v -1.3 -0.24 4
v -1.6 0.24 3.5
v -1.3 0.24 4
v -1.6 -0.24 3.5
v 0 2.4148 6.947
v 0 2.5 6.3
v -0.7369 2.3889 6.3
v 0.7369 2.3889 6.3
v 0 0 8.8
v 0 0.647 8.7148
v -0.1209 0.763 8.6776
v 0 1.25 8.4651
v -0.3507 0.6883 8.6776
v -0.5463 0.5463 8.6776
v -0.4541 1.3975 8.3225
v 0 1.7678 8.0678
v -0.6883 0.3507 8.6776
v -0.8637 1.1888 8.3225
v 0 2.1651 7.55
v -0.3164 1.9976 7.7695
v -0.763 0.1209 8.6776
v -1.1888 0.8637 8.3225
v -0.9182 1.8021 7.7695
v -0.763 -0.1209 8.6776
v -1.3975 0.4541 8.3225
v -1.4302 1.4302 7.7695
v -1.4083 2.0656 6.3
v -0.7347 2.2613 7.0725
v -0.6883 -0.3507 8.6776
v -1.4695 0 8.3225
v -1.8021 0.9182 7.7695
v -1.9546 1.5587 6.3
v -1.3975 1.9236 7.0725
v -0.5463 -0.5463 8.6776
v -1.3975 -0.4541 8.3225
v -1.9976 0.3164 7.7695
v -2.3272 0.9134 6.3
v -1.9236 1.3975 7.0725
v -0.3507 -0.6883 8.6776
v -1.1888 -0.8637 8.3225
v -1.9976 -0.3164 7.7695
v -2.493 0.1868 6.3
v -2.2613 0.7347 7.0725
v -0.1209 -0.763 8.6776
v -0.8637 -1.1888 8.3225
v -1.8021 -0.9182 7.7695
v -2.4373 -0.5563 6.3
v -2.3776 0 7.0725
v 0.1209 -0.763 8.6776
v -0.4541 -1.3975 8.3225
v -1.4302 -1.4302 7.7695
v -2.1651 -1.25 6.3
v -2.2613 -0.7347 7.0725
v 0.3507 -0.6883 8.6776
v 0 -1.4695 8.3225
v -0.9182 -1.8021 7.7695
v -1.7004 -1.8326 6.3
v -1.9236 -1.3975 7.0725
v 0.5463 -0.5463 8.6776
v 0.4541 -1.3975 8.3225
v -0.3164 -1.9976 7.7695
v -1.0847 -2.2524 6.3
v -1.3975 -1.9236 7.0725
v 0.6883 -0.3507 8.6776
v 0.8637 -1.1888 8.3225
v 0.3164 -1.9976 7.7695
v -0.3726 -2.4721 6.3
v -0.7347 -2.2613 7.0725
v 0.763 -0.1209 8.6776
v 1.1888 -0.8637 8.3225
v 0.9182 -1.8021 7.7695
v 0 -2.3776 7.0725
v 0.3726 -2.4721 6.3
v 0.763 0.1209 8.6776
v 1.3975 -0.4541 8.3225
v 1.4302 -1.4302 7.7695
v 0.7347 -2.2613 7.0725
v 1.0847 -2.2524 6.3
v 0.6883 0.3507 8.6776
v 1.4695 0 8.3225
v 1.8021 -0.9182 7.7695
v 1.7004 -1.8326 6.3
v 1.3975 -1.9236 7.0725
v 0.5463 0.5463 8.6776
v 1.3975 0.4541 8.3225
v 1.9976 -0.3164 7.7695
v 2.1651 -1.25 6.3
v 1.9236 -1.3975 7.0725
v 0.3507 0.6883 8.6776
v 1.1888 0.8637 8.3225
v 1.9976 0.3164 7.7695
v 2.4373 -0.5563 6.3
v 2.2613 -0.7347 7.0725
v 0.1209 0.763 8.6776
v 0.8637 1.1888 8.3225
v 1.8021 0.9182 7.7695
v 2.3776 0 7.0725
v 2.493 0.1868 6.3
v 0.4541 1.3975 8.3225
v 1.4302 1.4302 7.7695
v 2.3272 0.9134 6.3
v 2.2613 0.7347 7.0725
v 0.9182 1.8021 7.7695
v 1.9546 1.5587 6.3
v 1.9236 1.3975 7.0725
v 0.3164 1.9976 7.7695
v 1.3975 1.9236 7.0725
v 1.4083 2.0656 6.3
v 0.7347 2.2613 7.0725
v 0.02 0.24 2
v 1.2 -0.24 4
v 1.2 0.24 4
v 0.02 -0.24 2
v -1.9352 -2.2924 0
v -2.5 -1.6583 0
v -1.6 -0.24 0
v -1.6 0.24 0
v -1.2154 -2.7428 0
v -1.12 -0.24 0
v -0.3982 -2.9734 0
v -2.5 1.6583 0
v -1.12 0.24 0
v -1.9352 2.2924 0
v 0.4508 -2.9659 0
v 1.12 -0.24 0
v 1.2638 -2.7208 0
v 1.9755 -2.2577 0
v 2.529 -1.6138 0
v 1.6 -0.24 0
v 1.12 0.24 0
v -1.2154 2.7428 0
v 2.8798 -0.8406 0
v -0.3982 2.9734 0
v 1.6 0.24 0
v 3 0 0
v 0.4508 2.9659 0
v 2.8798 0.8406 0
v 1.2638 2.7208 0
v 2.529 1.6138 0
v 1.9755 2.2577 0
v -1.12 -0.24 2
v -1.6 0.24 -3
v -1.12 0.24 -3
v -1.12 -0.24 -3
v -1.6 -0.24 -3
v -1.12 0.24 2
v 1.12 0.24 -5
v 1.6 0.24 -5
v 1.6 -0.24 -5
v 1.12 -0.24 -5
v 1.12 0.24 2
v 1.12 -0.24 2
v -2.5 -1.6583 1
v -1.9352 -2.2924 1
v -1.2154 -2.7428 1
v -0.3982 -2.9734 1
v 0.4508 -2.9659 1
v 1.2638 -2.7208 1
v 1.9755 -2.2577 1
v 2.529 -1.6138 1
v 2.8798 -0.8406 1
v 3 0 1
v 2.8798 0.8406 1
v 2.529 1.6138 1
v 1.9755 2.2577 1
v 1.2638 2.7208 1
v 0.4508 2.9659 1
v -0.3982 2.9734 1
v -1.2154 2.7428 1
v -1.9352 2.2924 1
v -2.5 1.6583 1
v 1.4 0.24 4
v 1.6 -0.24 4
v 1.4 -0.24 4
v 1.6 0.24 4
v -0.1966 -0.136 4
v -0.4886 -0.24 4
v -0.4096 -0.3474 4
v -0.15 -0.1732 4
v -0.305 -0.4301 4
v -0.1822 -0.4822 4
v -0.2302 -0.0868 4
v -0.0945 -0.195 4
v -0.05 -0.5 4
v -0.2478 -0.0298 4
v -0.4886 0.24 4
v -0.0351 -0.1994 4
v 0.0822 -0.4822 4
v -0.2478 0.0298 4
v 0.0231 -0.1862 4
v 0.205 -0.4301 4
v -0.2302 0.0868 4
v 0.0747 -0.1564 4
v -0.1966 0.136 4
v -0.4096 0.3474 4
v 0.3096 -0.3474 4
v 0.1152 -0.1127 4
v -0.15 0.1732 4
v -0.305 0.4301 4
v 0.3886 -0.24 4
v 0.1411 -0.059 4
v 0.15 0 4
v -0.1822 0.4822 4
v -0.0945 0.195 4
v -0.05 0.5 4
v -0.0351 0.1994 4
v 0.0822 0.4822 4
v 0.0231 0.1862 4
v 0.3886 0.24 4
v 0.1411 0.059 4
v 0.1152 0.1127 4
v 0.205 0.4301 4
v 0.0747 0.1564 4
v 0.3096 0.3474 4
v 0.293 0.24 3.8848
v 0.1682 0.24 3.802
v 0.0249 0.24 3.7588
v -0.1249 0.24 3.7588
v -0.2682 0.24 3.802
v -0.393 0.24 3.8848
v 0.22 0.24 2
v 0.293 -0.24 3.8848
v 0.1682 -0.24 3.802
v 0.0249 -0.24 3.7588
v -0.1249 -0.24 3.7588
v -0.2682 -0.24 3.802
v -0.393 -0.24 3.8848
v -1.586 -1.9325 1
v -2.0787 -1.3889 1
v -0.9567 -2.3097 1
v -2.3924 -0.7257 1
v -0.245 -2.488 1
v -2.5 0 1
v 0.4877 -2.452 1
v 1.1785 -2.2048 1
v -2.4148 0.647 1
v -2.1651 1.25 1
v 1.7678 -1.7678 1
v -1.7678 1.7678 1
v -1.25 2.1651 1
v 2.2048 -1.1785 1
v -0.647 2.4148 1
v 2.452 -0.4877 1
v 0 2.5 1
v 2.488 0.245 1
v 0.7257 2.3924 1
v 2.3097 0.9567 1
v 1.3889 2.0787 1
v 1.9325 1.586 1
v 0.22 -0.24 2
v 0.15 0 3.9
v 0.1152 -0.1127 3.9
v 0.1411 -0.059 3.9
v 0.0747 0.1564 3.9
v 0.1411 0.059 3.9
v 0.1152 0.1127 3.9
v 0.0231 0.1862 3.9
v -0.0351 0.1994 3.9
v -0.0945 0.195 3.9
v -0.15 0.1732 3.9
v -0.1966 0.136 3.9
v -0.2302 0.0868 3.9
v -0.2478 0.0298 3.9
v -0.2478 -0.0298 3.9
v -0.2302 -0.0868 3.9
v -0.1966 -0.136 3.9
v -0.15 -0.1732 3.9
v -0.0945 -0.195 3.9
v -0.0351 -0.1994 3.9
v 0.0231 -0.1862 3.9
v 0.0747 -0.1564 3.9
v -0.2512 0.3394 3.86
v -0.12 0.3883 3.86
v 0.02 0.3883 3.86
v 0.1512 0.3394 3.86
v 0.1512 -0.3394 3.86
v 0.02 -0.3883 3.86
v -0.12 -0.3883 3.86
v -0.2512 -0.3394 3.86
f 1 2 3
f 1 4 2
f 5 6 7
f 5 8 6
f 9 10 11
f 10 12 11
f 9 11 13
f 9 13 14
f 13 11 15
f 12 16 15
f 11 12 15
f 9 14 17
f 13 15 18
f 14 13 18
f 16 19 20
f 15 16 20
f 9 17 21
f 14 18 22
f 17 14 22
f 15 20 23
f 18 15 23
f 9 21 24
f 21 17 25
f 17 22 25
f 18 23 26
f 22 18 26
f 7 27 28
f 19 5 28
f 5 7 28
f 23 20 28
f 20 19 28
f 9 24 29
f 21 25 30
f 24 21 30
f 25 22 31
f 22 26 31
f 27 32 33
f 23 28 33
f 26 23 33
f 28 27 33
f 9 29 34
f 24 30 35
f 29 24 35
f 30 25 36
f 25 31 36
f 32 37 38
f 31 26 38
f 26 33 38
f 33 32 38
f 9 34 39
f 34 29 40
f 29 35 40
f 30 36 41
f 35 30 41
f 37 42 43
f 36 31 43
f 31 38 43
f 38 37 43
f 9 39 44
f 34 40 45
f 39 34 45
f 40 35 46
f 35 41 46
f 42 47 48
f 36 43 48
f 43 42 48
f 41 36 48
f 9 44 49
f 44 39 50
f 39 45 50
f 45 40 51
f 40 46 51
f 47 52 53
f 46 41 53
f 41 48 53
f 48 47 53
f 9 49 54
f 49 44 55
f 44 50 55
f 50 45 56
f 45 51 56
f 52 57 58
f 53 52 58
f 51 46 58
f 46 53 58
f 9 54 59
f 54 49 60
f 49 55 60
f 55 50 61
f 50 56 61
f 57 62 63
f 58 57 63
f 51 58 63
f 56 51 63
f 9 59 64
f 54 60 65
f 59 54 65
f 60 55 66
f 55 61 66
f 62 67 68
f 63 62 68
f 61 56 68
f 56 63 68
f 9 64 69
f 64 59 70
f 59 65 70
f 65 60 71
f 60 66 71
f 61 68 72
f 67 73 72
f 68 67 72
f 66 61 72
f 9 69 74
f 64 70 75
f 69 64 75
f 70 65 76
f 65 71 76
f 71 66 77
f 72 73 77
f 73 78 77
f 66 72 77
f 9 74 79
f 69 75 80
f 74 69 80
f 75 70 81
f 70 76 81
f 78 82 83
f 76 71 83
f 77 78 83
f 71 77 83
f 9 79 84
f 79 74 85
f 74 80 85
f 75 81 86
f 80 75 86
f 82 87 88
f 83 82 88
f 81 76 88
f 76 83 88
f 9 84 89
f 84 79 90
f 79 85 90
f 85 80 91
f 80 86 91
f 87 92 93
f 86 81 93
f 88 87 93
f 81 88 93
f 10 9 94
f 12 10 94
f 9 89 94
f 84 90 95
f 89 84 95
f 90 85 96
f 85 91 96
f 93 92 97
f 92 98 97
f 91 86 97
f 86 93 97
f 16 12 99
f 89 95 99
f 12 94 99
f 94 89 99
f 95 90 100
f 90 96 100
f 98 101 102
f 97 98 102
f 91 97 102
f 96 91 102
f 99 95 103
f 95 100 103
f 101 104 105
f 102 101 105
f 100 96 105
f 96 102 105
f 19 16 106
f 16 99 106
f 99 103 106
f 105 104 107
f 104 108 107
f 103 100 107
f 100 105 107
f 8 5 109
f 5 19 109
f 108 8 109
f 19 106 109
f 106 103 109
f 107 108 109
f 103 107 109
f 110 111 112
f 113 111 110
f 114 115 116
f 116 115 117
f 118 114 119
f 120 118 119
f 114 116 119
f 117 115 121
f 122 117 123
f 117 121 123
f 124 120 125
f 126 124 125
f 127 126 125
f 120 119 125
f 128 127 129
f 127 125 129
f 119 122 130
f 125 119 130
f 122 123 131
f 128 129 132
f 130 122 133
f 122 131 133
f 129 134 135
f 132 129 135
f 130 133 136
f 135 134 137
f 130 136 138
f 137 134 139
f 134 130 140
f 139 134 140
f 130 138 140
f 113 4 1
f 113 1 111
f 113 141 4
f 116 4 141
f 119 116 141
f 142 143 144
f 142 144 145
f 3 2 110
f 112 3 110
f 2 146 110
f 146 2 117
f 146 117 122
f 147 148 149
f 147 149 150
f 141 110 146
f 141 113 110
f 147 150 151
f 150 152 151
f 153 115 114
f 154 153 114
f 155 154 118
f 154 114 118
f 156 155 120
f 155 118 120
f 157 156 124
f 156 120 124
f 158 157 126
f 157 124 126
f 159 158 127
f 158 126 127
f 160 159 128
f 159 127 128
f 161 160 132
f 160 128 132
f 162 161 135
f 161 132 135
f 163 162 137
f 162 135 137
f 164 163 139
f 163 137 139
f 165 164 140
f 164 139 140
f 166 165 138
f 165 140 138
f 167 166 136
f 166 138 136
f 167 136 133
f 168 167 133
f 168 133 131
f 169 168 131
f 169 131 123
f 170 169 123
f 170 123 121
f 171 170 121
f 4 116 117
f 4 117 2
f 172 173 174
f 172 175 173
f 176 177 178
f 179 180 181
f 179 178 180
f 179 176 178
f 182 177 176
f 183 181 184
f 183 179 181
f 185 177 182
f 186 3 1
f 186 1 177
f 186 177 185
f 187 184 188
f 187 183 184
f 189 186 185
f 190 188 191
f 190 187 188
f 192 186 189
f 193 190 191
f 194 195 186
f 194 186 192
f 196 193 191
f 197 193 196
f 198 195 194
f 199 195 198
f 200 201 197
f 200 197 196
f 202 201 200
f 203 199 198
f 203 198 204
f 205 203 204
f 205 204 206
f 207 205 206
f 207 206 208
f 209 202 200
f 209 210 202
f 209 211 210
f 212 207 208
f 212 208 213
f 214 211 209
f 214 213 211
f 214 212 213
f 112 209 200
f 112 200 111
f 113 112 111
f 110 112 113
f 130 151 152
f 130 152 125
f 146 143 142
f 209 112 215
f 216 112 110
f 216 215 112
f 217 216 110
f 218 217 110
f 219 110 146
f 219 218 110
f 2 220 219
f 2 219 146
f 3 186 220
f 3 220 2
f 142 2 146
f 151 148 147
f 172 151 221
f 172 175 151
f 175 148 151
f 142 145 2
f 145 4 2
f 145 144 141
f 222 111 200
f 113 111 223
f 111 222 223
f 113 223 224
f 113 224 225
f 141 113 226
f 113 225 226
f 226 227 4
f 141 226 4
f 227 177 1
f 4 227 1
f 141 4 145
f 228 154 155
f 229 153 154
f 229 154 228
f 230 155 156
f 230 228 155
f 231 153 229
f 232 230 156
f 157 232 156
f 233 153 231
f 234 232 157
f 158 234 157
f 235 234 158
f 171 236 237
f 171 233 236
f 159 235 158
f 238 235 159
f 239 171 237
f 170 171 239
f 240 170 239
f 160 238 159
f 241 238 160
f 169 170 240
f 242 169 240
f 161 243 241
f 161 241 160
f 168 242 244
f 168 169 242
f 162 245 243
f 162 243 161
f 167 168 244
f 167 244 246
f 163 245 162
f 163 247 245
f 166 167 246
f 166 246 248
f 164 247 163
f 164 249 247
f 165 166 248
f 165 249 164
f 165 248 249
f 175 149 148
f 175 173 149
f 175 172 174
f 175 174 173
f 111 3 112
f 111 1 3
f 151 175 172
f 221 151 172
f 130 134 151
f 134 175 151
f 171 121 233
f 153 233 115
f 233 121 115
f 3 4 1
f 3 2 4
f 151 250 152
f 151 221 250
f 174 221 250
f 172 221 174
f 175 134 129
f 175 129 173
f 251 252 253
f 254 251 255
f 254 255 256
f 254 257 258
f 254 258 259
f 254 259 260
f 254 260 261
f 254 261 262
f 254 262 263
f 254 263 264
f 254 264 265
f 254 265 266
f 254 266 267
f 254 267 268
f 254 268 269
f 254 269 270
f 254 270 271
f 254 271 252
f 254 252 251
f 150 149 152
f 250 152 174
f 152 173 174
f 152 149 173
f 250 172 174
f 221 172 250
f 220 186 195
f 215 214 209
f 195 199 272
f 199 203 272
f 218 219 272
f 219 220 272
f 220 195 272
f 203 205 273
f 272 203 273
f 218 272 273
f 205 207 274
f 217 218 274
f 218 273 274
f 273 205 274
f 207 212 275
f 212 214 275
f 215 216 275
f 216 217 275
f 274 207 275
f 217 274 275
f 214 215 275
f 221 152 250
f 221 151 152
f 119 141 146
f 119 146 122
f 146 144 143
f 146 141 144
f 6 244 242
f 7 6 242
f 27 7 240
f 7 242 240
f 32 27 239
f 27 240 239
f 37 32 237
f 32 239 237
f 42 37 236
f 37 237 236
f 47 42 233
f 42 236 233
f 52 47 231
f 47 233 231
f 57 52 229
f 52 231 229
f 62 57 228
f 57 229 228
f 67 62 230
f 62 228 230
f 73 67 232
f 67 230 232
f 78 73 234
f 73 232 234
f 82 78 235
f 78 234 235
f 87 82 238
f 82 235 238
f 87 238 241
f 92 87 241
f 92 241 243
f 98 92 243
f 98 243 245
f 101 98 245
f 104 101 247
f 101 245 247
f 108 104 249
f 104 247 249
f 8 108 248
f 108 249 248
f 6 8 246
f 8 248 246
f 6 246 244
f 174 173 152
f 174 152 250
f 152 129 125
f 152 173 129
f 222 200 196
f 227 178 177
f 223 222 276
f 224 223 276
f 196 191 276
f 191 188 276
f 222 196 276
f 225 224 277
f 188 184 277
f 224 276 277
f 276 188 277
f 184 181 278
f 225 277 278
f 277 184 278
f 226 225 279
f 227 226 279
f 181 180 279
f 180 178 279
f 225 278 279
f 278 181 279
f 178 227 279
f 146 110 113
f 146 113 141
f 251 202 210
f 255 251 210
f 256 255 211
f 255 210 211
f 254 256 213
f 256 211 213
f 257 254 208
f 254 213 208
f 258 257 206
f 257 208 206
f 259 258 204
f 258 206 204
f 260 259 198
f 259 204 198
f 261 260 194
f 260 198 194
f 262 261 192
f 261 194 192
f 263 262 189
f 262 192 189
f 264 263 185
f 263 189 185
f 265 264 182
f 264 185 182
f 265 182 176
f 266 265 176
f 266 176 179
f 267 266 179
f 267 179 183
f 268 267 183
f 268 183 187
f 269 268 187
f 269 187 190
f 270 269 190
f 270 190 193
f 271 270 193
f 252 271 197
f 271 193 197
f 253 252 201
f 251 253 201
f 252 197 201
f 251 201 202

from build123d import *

# Parameters (mm, degrees)
ESBO_O1_R                  = 3
RESSALTO_EXTRUS_O1_DEPTH   = 1
CORTE_EXTRUS_O1_DEPTH      = 1
ESBO_O5_W                  = 0.48
ESBO_O5_H                  = 0.48
RESSALTO_EXTRUS_O2_DEPTH   = 3
RESSALTO_EXTRUS_O2_2_DEPTH = 3
ESBO_O6_W                  = 0.48
ESBO_O6_H                  = 0.48
RESSALTO_EXTRUS_O3_DEPTH   = 2
CORTE_EXTRUS_O2_DEPTH      = 0.24
RESSALTO_EXTRUS_O4_DEPTH   = 0.24
RESSALTO_EXTRUS_O4_2_DEPTH = 0.24
ESBO_O12_R                 = 0.2
CORTE_EXTRUS_O3_DEPTH      = 0.1


with BuildPart() as part:
    # Esboço1 → Ressalto-extrusão1 (new body)
    with BuildSketch(Plane.XY):
        Circle(ESBO_O1_R)
    extrude(amount=RESSALTO_EXTRUS_O1_DEPTH)

    # Esboço3 → Revolução1 (revolve)
    with BuildSketch(Plane(origin=(0, 0, 0), x_dir=(0, 0, -1), z_dir=(1, 0, 0))):
        with BuildLine():
            Line((-1, 0), (-8.8, 0))
            ThreePointArc((-8.8, 0), (-8.067766953, 1.767766953), (-6.3, 2.5))
            Line((-6.3, 2.5), (-1, 2.5))
            Line((-1, 2.5), (-1, 0))
        make_face()
    revolve(axis=Axis((0, 0, 1), (0, 0, 1)))

    # Esboço4 → Corte-extrusão1 (cut)
    with BuildSketch(Plane(origin=(0, 0, 0), x_dir=(-1, 0, 0), z_dir=(0, 0, -1))):
        with BuildLine():
            Line((2.5, 1.658312395), (2.5, -1.658312395))
            ThreePointArc((2.5, -1.658312395), (3, 0), (2.5, 1.658312395))
        make_face()
    extrude(amount=-CORTE_EXTRUS_O1_DEPTH, mode=Mode.SUBTRACT)

    # Esboço7 → Corte-extrusão2 (cut, symmetric)
    with BuildSketch(Plane(origin=(0, 0, 0), x_dir=(1, 0, 0), z_dir=(0, 1, 0))):
        Polygon((-1.6, 0), (-1.6, -3.5), (-1.3, -4), (1.2, -4), (0.02, -2), (-1.12, -2), (-1.12, 0), align=None)
        Polygon((1.6, 0), (1.6, -4), (1.4, -4), (0.22, -2), (1.12, -2), (1.12, 0), align=None)
    extrude(amount=CORTE_EXTRUS_O2_DEPTH, both=True, mode=Mode.SUBTRACT)


with BuildPart() as body_2:
    # Esboço5 → Ressalto-extrusão2 (new body)
    with BuildSketch(Plane(origin=(0, 0, 0), x_dir=(-1, 0, 0), z_dir=(0, 0, -1))):
        with Locations((-1.36, 0)):
            Rectangle(ESBO_O5_W, ESBO_O5_H)
    extrude(amount=RESSALTO_EXTRUS_O2_DEPTH)


with BuildPart() as body_3:
    # Esboço5 → Ressalto-extrus_o2 2 (new body)
    with BuildSketch(Plane(origin=(0, 0, 0), x_dir=(-1, 0, 0), z_dir=(0, 0, -1))):
        with Locations((1.36, 0)):
            Rectangle(ESBO_O5_W, ESBO_O5_H)
    extrude(amount=RESSALTO_EXTRUS_O2_2_DEPTH)


with BuildPart() as body_4:
    # Esboço6 → Ressalto-extrusão3 (new body)
    with BuildSketch(Plane(origin=(0, 0, -3), x_dir=(-1, 0, 0), z_dir=(0, 0, -1))):
        with Locations((-1.36, 0)):
            Rectangle(ESBO_O6_W, ESBO_O6_H)
    extrude(amount=RESSALTO_EXTRUS_O3_DEPTH)


with BuildPart() as body_5:
    # Esboço8 → Ressalto-extrusão4 (new, symmetric)
    with BuildSketch(Plane(origin=(0, 0, 0), x_dir=(1, 0, 0), z_dir=(0, 1, 0))):
        Polygon((-1.3, -4), (1.2, -4), (0.02, -2), (-1.12, -2), (-1.12, 0), (-1.6, 0), (-1.6, -3.5), align=None)
    extrude(amount=RESSALTO_EXTRUS_O4_DEPTH, both=True)

    # Combinar2: union body 3
    add(body_3.part)

    # Esboço10 → Corte-Revolução1 (revolve, cut)
    with BuildSketch(Plane(origin=(0, 0, 0), x_dir=(1, 0, 0), z_dir=(0, 1, 0))):
        with BuildLine():
            Line((-0.05, -4), (-0.05, -3.7))
            ThreePointArc((-0.05, -3.7), (-0.341547595, -3.780754009), (-0.55, -4))
            Line((-0.55, -4), (-0.05, -4))
        make_face()
    revolve(axis=Axis((-0.05, 0, 4), (0, 0, -1)), mode=Mode.SUBTRACT)


with BuildPart() as body_6:
    # Esboço8 → Ressalto-extrus_o4 2 (new, symmetric)
    with BuildSketch(Plane(origin=(0, 0, 0), x_dir=(1, 0, 0), z_dir=(0, 1, 0))):
        Polygon((0.22, -2), (1.4, -4), (1.6, -4), (1.6, 0), (1.12, 0), (1.12, -2), align=None)
    extrude(amount=RESSALTO_EXTRUS_O4_2_DEPTH, both=True)

    # Combinar1: union body 4, body 2
    add(body_4.part)
    add(body_2.part)


with BuildPart() as body_4_2:
    # Esboço11 → Revolução2 (revolve)
    with BuildSketch(Plane(origin=(0, 0, 0), x_dir=(1, 0, 0), z_dir=(0, 1, 0))):
        with BuildLine():
            Line((-0.55, -4), (-0.05, -4))
            Line((-0.05, -4), (-0.05, -3.7))
            ThreePointArc((-0.05, -3.7), (-0.341547595, -3.780754009), (-0.55, -4))
        make_face()
    revolve(axis=Axis((-0.05, 0, 4), (0, 0, -1)))

    # Combinar3: union body 5
    add(body_5.part)

    # Esboço12 → Corte-extrusão3 (cut)
    with BuildSketch(Plane.XY.offset(4)):
        with Locations((-0.05, 0)):
            Circle(ESBO_O12_R)
    extrude(amount=-CORTE_EXTRUS_O3_DEPTH, mode=Mode.SUBTRACT)


solid = Compound([part.part, body_6.part, body_4_2.part])
